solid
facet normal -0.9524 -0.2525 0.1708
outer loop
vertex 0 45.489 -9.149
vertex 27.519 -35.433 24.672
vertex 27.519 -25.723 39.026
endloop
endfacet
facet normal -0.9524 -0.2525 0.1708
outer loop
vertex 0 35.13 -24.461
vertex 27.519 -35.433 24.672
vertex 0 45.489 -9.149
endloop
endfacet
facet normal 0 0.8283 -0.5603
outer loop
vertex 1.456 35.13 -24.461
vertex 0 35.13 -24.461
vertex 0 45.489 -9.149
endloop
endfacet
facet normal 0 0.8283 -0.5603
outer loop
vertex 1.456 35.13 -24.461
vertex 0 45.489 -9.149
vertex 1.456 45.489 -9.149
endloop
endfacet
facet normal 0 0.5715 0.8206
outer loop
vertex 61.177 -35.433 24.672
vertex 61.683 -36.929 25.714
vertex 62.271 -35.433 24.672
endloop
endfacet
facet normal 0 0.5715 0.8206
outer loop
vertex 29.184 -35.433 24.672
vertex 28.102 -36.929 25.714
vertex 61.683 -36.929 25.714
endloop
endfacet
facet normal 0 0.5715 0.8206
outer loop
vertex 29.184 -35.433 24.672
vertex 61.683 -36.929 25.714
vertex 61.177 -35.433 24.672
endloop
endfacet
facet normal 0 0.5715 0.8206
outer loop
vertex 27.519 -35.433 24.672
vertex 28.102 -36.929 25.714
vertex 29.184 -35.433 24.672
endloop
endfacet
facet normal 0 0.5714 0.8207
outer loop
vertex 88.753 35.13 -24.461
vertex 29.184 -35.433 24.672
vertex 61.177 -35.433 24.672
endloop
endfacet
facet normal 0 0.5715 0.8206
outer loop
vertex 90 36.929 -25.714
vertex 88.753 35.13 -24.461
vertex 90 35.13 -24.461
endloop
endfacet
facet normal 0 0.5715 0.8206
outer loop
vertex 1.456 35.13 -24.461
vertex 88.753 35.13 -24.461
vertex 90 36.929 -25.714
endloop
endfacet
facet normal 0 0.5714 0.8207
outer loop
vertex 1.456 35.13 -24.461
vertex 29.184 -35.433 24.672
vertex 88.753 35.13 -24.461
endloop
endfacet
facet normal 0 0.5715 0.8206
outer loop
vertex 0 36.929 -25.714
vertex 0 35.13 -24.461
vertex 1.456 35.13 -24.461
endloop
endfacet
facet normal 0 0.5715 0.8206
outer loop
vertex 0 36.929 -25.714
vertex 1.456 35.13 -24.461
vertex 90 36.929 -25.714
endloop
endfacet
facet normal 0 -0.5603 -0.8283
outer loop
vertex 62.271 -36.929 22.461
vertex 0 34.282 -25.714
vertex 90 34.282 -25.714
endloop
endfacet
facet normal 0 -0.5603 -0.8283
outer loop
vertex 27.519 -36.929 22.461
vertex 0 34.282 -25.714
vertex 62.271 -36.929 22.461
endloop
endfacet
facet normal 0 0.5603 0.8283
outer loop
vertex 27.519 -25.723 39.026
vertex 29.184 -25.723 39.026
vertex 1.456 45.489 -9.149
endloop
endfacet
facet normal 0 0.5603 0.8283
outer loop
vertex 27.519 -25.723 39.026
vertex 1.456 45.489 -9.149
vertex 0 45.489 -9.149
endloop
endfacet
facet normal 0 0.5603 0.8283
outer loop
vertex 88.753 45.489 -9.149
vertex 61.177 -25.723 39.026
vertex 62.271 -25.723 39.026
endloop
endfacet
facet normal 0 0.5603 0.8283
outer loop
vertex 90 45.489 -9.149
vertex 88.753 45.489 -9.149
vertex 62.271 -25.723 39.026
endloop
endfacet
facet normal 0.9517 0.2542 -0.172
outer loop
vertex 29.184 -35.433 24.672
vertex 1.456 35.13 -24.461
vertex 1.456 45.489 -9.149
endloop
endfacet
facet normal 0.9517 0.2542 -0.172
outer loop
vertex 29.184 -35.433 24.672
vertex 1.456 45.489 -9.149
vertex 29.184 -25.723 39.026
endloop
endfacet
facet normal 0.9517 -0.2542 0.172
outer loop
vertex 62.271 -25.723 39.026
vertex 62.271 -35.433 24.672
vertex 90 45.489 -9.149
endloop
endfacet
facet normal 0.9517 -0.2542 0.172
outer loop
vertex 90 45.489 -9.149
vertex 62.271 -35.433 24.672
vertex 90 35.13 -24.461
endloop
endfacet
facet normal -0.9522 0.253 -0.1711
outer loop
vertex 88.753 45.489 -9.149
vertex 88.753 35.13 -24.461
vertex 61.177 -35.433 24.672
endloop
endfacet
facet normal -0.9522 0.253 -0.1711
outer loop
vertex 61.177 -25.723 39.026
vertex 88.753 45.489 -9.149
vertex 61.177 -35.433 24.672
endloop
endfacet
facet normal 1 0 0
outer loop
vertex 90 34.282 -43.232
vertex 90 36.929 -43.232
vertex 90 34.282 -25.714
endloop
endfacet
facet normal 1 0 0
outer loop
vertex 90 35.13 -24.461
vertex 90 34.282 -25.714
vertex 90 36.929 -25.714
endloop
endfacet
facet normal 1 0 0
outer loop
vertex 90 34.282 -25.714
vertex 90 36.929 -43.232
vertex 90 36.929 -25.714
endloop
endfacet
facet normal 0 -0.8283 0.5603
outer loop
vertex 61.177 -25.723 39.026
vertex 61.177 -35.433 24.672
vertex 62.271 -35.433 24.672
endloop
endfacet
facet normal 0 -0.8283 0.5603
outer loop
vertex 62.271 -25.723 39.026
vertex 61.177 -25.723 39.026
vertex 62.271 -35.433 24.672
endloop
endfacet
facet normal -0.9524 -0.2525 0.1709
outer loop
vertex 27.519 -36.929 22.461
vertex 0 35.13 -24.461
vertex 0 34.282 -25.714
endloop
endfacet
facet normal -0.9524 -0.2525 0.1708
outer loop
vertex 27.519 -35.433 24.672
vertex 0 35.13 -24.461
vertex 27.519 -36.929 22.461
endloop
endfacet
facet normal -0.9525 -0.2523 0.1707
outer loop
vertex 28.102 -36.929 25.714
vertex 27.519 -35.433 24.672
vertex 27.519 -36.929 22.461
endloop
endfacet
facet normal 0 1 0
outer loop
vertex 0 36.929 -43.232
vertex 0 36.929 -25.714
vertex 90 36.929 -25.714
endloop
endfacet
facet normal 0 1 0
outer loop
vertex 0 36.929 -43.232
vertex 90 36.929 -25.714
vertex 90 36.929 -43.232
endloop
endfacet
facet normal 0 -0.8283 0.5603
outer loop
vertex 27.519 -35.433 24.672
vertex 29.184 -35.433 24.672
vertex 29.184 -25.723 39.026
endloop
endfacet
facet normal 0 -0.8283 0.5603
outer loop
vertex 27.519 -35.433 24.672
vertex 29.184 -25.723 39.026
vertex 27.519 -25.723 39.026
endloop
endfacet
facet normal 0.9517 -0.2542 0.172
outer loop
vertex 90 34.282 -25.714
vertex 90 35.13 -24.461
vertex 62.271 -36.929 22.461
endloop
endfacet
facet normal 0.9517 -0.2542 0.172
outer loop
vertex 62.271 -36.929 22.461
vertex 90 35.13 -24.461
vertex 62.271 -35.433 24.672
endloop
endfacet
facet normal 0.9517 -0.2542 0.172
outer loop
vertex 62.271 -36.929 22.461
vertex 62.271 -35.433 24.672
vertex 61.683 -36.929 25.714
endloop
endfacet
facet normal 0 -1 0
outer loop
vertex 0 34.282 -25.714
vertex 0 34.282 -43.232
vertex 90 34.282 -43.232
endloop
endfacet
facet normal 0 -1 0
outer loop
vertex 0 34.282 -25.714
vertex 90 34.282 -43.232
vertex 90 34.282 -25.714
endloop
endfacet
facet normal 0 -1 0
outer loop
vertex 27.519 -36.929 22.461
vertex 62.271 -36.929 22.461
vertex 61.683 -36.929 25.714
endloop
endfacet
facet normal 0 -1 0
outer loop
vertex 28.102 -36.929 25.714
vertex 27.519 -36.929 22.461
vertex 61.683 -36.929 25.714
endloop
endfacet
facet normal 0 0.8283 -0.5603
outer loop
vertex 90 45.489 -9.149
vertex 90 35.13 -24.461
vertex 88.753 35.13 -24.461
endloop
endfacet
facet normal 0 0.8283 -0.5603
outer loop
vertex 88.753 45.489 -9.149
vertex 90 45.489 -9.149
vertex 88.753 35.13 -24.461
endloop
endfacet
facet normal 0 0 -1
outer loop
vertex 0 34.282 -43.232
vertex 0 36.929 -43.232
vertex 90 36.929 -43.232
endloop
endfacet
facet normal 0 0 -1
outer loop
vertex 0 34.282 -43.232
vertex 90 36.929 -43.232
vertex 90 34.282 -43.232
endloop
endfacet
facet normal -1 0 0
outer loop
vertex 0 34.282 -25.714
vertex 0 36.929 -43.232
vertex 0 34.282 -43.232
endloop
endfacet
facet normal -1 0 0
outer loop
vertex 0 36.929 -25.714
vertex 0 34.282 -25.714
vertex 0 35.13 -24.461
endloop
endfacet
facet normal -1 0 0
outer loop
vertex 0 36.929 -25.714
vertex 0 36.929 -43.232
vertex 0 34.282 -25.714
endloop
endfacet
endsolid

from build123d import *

# Parameters (mm, degrees)
BOSS_EXTRUDE1_DEPTH          = 90
CUT_EXTRUDE_THIN5_DEPTH      = 107.179219538
CUT_EXTRUDE_THIN5_DEPTH_BACK = 90
CUT_EXTRUDE_THIN6_DEPTH      = 107.179219538
CUT_EXTRUDE_THIN6_DEPTH_BACK = 90
BOSS_EXTRUDE2_DEPTH          = 20
BOSS_EXTRUDE3_DEPTH          = 20


with BuildPart() as part:
    # Sketch1 → Boss-Extrude1 (new body)
    with BuildSketch(Plane(origin=(0, 0, 0), x_dir=(0, 0, -1), z_dir=(1, 0, 0))):
        Polygon((-25.714309173, -36.929314965), (25.714309173, 36.929314965), (43.232455695, 36.929314965), (43.232455695, 34.281986352), (25.714309173, 34.281986352), (-22.460611748, -36.929314965), align=None)
    extrude(amount=BOSS_EXTRUDE1_DEPTH)

    # Sketch5 → Cut-Extrude-Thin5 (cut, two sides: drawn at the far end of the back side and taken through both)
    with BuildSketch(Plane(origin=(0, -1.17061758, -1.730385845), x_dir=(-1, 0, 0), z_dir=(0, -0.560329875322556, -0.8282695399572587)).offset(-CUT_EXTRUDE_THIN5_DEPTH_BACK)):
        Polygon((-90, 42.803220717), (-61.682852786, -44.99592237), (-90.234601267, -54.204486788), (-118.551748482, 33.594656299), align=None)
    extrude(amount=CUT_EXTRUDE_THIN5_DEPTH + CUT_EXTRUDE_THIN5_DEPTH_BACK, mode=Mode.SUBTRACT)

    # Sketch6 → Cut-Extrude-Thin6 (cut, two sides: drawn at the far end of the back side and taken through both)
    with BuildSketch(Plane(origin=(0, -1.17061758, -1.730385845), x_dir=(-1, 0, 0), z_dir=(0, -0.560329875322556, -0.8282695399572587)).offset(-CUT_EXTRUDE_THIN6_DEPTH_BACK)):
        Polygon((0, 42.803220717), (-28.102327933, -44.99592237), (0.469772757, -54.141143098), (28.57210069, 33.657999989), align=None)
    extrude(amount=CUT_EXTRUDE_THIN6_DEPTH + CUT_EXTRUDE_THIN6_DEPTH_BACK, mode=Mode.SUBTRACT)

    # Sketch7 → Boss-Extrude2 (add)
    with BuildSketch(Plane(origin=(0, -1.17061758, -1.730385845), x_dir=(-1, 0, 0), z_dir=(0, -0.560329875322556, -0.8282695399572587))):
        Polygon((-88.752727637, 42.803220717), (-61.177479126, -43.172778497), (-62.270856627, -43.172778497), (-90, 42.803220717), align=None)
    extrude(amount=-BOSS_EXTRUDE2_DEPTH)

    # Sketch8 → Boss-Extrude3 (add)
    with BuildSketch(Plane(origin=(0, -1.17061758, -1.730385845), x_dir=(-1, 0, 0), z_dir=(0, -0.560329875322556, -0.8282695399572587))):
        Polygon((0, 42.803220717), (-1.455878042, 42.803220717), (-29.184434589, -43.172778497), (-27.518784801, -43.172778497), align=None)
    extrude(amount=-BOSS_EXTRUDE3_DEPTH)


solid = part.part
